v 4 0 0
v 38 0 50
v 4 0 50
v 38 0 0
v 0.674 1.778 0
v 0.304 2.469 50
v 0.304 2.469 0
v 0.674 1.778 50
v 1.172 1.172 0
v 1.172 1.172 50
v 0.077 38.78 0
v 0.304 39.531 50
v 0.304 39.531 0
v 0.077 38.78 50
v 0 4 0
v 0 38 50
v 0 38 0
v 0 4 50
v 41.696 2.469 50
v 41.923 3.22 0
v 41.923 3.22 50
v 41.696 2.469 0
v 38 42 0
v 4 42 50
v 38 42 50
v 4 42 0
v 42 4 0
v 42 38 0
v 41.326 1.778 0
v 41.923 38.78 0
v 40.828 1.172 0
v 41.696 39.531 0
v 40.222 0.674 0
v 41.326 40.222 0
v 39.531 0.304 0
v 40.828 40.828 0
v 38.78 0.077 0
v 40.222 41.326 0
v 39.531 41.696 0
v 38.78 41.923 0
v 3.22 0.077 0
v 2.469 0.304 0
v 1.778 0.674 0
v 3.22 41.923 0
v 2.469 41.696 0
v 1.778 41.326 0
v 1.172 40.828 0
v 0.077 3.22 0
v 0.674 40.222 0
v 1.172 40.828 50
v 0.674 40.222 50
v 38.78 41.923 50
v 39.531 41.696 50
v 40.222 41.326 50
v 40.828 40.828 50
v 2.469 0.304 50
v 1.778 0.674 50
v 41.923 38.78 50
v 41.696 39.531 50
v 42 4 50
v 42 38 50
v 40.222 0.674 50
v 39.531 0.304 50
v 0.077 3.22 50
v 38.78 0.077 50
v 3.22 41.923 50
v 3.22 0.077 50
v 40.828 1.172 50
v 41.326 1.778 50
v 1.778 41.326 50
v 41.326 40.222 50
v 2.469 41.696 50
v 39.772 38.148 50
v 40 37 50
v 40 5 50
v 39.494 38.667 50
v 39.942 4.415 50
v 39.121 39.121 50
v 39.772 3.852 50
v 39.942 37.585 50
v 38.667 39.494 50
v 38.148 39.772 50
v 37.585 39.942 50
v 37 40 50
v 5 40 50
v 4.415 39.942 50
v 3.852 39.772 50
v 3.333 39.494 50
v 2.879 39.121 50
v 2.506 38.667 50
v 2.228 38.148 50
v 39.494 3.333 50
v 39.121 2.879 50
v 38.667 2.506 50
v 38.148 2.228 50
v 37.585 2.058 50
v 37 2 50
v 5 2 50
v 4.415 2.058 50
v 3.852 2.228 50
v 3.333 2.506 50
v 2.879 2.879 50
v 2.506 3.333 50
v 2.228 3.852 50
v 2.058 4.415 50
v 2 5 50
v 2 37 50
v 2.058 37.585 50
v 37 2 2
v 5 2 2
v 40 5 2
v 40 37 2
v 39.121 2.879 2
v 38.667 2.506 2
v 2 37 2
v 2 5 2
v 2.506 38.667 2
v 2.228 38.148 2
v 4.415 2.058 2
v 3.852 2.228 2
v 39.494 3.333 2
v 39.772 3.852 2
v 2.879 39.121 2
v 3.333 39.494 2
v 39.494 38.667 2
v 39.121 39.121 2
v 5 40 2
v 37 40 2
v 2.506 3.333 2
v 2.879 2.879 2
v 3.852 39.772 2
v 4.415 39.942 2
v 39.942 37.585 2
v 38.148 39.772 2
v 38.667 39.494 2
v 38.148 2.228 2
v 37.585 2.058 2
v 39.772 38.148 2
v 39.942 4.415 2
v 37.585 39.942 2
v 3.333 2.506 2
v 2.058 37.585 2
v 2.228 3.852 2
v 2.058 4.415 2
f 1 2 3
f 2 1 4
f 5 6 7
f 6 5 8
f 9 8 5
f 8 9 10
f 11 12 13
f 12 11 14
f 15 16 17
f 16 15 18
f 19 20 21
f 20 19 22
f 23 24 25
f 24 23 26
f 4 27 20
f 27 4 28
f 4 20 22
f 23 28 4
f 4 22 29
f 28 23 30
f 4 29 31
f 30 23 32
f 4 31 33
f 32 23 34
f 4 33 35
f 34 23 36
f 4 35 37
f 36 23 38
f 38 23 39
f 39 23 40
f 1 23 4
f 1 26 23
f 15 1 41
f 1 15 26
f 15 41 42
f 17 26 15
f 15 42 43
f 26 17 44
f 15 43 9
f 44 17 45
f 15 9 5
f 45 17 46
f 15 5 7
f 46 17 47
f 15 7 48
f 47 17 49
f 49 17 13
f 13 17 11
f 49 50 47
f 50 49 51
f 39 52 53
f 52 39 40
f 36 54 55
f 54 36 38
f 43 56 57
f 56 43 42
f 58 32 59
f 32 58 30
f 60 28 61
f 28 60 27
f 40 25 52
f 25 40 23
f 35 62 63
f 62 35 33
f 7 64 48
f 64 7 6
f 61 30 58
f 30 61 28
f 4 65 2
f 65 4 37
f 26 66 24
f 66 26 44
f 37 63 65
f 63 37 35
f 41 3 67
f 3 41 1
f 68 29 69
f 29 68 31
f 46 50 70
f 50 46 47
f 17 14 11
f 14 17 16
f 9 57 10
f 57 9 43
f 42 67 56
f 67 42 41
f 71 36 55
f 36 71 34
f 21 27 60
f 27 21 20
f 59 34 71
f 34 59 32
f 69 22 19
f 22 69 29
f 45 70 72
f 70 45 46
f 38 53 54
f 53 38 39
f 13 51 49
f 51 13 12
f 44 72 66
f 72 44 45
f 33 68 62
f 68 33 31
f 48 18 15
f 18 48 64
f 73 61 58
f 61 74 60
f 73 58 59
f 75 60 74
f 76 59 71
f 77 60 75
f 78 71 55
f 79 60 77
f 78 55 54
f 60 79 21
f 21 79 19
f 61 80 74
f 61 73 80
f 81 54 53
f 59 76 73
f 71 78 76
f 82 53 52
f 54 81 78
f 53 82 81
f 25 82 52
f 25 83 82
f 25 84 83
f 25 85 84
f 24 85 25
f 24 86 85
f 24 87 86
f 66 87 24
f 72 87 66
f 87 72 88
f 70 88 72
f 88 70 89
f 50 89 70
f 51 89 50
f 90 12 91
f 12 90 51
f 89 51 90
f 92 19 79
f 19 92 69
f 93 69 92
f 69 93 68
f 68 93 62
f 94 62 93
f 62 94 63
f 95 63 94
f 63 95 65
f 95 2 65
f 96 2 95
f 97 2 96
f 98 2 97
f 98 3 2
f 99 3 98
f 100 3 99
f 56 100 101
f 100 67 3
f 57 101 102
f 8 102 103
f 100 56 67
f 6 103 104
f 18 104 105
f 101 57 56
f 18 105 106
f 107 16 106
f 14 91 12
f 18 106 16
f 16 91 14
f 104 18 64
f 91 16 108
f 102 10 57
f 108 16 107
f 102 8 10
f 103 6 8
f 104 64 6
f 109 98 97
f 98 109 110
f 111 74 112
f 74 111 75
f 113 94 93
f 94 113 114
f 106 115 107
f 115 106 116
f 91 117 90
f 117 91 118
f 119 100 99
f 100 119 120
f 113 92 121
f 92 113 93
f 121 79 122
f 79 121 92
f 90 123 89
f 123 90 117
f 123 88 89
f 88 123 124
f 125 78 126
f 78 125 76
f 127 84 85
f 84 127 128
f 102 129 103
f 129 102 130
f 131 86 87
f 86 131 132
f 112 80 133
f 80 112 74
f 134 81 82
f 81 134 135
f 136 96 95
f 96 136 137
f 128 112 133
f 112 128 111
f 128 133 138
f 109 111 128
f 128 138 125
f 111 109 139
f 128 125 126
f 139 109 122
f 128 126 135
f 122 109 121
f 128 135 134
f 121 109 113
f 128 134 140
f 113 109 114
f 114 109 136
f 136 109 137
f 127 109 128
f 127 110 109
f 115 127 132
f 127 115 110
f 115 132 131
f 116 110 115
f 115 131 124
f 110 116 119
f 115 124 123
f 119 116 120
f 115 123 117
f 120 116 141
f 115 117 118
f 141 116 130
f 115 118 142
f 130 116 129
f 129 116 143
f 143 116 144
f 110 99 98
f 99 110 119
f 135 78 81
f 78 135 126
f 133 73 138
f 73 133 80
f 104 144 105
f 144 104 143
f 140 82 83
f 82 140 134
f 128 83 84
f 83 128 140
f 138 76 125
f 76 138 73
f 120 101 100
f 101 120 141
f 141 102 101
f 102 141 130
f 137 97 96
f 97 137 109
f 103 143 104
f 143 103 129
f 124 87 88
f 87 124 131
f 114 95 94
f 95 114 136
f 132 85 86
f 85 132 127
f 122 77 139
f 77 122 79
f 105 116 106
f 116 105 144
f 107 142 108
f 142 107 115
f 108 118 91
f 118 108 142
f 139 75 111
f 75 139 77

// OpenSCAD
// Vorea Studio — Parametric Storage Bin
// Customizable desktop organizer bin with rounded corners
// Compatible: Vorea Studio SCAD Engine

// [Section: Dimensions]
width = 42;       // [20:2:100] Ancho (mm)
depth = 42;       // [20:2:100] Profundidad (mm)
height = 50;      // [15:5:120] Altura (mm)
wall = 2;         // [1:0.5:5] Grosor de pared

// [Section: Design]
corner_r = 4;     // [1:1:15] Radio de esquinas
bottom = 2;       // [1:0.5:5] Grosor de fondo
divisions_x = 1;  // [1:1:4] Divisiones horizontales
divisions_y = 1;  // [1:1:4] Divisiones verticales

$fn = 32;

// Rounded box module
module rounded_box(w, d, h, r) {
  hull() {
    translate([r, r, 0]) cylinder(r=r, h=h);
    translate([w-r, r, 0]) cylinder(r=r, h=h);
    translate([r, d-r, 0]) cylinder(r=r, h=h);
    translate([w-r, d-r, 0]) cylinder(r=r, h=h);
  }
}

// Main bin
difference() {
  // Outer shell
  rounded_box(width, depth, height, corner_r);
  
  // Inner cavity
  translate([wall, wall, bottom])
    rounded_box(width - wall*2, depth - wall*2, height, corner_r - wall/2);
}

// Internal dividers X
if (divisions_x > 1) {
  for (i = [1 : divisions_x - 1]) {
    translate([width / divisions_x * i - wall/4, wall, bottom])
      cube([wall/2, depth - wall*2, height - bottom]);
  }
}

// Internal dividers Y
if (divisions_y > 1) {
  for (i = [1 : divisions_y - 1]) {
    translate([wall, depth / divisions_y * i - wall/4, bottom])
      cube([width - wall*2, wall/2, height - bottom]);
  }
}
